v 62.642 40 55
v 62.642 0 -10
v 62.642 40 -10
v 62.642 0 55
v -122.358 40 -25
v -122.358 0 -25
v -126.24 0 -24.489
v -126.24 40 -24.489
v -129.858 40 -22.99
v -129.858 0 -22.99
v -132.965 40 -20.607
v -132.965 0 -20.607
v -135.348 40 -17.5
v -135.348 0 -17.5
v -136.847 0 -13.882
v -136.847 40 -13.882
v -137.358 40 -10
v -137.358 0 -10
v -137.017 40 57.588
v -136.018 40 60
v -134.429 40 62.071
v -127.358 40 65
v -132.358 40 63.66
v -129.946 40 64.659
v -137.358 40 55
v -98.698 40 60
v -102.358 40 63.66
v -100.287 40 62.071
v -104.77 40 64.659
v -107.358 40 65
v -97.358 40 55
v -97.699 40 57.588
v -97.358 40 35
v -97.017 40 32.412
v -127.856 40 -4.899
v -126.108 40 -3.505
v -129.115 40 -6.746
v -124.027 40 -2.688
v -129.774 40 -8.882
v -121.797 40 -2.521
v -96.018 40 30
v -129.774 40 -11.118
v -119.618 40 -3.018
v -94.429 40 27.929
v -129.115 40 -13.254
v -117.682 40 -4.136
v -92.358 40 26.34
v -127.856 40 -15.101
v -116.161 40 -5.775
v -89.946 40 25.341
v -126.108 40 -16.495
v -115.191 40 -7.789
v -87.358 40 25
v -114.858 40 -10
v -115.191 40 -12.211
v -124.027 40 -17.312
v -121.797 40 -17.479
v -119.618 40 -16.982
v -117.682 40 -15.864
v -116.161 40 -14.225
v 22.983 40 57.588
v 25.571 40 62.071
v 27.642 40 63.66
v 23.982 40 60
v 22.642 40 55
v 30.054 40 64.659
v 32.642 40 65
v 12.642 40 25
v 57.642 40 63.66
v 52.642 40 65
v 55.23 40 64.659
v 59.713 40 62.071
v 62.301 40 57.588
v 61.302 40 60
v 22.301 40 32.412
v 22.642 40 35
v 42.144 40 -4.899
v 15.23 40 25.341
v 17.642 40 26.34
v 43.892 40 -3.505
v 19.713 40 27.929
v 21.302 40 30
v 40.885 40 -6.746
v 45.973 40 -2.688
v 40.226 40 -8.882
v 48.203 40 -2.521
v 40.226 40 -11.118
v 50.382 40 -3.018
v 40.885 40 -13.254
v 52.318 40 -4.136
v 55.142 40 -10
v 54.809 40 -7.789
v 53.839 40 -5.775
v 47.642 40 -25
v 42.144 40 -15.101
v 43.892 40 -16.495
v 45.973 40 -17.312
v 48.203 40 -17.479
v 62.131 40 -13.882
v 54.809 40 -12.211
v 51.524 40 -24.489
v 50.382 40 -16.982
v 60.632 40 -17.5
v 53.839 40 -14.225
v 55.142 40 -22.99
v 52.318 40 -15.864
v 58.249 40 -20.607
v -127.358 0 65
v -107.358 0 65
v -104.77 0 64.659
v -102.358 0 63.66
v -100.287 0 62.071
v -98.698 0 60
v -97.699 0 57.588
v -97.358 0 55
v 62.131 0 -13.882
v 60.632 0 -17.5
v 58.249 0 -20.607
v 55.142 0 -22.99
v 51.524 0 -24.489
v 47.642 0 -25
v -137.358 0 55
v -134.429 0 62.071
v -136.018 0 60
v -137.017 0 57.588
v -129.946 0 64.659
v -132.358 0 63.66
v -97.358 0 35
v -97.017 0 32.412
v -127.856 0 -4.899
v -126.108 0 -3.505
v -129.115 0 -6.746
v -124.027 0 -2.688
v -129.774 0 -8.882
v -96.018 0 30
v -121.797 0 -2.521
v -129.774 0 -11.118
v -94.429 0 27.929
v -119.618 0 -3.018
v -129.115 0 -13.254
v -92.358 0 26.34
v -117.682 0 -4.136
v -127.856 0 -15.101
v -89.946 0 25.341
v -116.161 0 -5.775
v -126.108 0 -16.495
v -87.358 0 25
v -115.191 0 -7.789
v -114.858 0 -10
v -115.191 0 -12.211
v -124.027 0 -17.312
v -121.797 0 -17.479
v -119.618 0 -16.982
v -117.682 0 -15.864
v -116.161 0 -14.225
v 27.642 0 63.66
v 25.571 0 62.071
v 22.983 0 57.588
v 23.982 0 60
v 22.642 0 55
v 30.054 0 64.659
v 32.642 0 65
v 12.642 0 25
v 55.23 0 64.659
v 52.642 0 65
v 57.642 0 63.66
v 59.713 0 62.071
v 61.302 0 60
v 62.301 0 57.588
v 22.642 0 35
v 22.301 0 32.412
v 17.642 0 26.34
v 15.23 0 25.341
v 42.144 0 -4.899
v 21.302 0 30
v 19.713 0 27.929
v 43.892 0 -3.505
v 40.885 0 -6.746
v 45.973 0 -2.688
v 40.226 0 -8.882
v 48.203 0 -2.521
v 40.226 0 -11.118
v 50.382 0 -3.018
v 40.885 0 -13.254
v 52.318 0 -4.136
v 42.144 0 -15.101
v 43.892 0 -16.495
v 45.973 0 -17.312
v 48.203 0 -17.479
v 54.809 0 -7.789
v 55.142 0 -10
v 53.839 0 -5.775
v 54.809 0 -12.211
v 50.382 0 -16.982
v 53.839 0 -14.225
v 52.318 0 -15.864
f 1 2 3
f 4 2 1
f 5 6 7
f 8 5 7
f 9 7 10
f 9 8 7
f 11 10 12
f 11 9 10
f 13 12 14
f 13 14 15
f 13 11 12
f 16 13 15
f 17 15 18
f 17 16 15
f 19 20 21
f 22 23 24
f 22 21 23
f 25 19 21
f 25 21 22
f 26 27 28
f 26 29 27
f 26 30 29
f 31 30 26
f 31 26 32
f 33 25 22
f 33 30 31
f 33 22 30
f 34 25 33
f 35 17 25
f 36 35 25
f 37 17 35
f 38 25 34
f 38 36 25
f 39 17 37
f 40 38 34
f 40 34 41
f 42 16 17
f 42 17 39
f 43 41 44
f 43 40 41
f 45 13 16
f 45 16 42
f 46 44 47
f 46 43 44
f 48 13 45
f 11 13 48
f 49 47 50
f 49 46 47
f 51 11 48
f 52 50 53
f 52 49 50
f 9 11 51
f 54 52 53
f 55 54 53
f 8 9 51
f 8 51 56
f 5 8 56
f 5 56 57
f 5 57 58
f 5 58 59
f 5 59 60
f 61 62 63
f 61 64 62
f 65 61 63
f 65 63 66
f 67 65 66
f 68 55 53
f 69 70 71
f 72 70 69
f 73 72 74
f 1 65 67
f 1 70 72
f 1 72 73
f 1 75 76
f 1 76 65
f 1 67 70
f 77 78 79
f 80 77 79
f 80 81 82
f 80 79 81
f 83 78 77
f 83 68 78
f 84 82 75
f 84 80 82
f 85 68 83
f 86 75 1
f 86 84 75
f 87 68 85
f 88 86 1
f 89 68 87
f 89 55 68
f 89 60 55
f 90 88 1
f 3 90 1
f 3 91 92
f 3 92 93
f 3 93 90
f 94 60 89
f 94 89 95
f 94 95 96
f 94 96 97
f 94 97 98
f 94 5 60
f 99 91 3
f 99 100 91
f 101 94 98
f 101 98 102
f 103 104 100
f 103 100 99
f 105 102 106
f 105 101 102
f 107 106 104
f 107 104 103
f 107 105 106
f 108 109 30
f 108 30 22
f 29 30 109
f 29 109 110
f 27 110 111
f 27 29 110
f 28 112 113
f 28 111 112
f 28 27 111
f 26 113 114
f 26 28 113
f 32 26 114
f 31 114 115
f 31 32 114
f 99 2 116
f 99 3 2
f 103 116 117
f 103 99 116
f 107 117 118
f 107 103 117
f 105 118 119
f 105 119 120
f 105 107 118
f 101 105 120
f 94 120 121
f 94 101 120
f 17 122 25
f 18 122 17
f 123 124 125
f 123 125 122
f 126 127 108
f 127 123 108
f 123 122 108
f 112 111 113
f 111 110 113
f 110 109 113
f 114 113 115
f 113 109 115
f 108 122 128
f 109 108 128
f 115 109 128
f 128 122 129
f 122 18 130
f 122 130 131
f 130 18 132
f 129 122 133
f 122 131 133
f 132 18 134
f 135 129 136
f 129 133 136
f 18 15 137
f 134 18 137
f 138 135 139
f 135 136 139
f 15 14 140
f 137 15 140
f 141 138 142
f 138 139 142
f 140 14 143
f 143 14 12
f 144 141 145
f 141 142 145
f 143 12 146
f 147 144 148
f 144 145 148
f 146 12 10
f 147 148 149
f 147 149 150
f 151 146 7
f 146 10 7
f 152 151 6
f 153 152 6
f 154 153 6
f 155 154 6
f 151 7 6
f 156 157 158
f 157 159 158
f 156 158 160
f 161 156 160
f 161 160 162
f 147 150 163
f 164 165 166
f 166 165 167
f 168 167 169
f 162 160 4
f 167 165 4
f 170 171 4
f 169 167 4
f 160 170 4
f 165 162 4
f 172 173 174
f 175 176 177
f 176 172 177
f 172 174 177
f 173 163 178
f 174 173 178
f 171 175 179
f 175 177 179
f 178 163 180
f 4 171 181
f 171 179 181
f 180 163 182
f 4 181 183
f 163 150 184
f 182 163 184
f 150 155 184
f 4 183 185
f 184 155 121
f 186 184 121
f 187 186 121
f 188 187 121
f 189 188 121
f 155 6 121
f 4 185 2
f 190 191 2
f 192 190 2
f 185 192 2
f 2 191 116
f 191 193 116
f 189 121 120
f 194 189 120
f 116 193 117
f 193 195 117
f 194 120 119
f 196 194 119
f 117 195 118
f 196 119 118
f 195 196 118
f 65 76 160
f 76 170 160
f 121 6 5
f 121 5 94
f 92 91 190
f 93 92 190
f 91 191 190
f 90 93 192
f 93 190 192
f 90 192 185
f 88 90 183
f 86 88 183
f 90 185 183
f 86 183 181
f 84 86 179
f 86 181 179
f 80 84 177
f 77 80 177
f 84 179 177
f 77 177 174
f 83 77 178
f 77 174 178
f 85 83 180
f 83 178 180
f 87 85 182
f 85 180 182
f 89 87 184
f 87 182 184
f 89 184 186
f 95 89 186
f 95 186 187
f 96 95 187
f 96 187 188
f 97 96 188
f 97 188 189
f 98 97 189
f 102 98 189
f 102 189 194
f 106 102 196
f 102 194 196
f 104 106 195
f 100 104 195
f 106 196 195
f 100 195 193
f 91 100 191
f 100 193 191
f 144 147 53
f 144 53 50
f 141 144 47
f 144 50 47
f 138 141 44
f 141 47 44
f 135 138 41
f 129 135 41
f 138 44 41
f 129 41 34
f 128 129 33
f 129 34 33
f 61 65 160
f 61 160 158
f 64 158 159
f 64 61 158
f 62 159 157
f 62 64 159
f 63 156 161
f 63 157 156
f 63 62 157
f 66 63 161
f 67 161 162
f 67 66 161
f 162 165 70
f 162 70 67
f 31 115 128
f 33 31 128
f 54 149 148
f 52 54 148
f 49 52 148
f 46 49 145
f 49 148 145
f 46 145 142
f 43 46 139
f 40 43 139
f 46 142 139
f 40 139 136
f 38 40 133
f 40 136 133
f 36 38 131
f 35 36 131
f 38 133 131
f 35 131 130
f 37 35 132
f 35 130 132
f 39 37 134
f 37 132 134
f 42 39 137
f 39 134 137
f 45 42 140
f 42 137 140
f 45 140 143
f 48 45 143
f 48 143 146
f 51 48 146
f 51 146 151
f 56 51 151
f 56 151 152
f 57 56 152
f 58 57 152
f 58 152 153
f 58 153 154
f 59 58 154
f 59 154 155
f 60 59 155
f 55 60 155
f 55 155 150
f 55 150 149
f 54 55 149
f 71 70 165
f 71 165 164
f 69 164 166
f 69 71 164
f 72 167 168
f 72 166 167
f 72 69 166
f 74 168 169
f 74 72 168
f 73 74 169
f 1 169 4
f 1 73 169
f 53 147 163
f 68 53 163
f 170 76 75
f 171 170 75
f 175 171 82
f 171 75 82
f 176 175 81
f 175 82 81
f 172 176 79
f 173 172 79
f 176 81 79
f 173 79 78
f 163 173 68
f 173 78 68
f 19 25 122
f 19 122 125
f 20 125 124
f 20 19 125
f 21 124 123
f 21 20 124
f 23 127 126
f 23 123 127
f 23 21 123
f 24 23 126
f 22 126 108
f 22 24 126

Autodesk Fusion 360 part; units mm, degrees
sketch "Sketch1" plane through (0, 0, 0) normal (0, 1, 0) x (1, 0, 0)
  line L0 (-137.3579, 25) -> (62.6421, 25)
  line L1 (62.6421, 25) -> (62.6421, -65)
  line L2 (-137.3579, -65) -> (-137.3579, 25)
  line L3 (-97.3579, -65) -> (-97.3579, -25)
  line L4 (-97.3579, -25) -> (22.6421, -25)
  line L5 (22.6421, -25) -> (22.6421, -65)
  line L6 (62.6421, -65) -> (22.6421, -65)
  line L7 (-97.3579, -65) -> (-137.3579, -65)
  dimension "d1" = 200
  dimension "d2" = 90
  dimension "d8" = 50
extrude "Extrude1" add sketch "Sketch1" along normal blind 40
fillet "Fillet1" radius 10 6 edges at (-137.3579, 20, 65) (-97.3579, 20, 65) (-97.3579, 20, 25) (22.6421, 20, 25) (22.6421, 20, 65) (62.6421, 20, 65)
fillet "Fillet2" radius 15 2 edges at (-137.3579, 20, -25) (62.6421, 20, -25)
sketch "Sketch2" plane through (0, 0, 0) normal (0, -1, 0) x (1, 0, 0)
  arc A0 (47.6421, -25) -> (62.6421, -10) centre (47.6421, -10) ccw
  line L0 (62.6421, -10) -> (62.6421, 55)
  arc A1 (62.6421, 55) -> (52.6421, 65) centre (52.6421, 55) ccw
  line L1 (52.6421, 65) -> (32.6421, 65)
  arc A2 (32.6421, 65) -> (22.6421, 55) centre (32.6421, 55) ccw
  line L2 (22.6421, 55) -> (22.6421, 35)
  arc A3 (12.6421, 25) -> (22.6421, 35) centre (12.6421, 35) ccw
  line L3 (12.6421, 25) -> (-87.3579, 25)
  arc A4 (-97.3579, 35) -> (-87.3579, 25) centre (-87.3579, 35) ccw
  line L4 (-97.3579, 35) -> (-97.3579, 55)
  arc A5 (-97.3579, 55) -> (-107.3579, 65) centre (-107.3579, 55) ccw
  line L5 (-107.3579, 65) -> (-127.3579, 65)
  arc A6 (-127.3579, 65) -> (-137.3579, 55) centre (-127.3579, 55) ccw
  line L6 (-137.3579, 55) -> (-137.3579, -10)
  arc A7 (-137.3579, -10) -> (-122.3579, -25) centre (-122.3579, -10) ccw
  line L7 (-122.3579, -25) -> (47.6421, -25)
  circle A8 centre (-122.3579, -10) radius 7.5
  circle A9 centre (47.6421, -10) radius 7.5
  dimension "d13" = 15
  dimension "d14" = 15
extrude "Extrude2" cut sketch "Sketch2" against normal blind 40 contours A8 | A9
properties part number "Tutorial Part 1"
